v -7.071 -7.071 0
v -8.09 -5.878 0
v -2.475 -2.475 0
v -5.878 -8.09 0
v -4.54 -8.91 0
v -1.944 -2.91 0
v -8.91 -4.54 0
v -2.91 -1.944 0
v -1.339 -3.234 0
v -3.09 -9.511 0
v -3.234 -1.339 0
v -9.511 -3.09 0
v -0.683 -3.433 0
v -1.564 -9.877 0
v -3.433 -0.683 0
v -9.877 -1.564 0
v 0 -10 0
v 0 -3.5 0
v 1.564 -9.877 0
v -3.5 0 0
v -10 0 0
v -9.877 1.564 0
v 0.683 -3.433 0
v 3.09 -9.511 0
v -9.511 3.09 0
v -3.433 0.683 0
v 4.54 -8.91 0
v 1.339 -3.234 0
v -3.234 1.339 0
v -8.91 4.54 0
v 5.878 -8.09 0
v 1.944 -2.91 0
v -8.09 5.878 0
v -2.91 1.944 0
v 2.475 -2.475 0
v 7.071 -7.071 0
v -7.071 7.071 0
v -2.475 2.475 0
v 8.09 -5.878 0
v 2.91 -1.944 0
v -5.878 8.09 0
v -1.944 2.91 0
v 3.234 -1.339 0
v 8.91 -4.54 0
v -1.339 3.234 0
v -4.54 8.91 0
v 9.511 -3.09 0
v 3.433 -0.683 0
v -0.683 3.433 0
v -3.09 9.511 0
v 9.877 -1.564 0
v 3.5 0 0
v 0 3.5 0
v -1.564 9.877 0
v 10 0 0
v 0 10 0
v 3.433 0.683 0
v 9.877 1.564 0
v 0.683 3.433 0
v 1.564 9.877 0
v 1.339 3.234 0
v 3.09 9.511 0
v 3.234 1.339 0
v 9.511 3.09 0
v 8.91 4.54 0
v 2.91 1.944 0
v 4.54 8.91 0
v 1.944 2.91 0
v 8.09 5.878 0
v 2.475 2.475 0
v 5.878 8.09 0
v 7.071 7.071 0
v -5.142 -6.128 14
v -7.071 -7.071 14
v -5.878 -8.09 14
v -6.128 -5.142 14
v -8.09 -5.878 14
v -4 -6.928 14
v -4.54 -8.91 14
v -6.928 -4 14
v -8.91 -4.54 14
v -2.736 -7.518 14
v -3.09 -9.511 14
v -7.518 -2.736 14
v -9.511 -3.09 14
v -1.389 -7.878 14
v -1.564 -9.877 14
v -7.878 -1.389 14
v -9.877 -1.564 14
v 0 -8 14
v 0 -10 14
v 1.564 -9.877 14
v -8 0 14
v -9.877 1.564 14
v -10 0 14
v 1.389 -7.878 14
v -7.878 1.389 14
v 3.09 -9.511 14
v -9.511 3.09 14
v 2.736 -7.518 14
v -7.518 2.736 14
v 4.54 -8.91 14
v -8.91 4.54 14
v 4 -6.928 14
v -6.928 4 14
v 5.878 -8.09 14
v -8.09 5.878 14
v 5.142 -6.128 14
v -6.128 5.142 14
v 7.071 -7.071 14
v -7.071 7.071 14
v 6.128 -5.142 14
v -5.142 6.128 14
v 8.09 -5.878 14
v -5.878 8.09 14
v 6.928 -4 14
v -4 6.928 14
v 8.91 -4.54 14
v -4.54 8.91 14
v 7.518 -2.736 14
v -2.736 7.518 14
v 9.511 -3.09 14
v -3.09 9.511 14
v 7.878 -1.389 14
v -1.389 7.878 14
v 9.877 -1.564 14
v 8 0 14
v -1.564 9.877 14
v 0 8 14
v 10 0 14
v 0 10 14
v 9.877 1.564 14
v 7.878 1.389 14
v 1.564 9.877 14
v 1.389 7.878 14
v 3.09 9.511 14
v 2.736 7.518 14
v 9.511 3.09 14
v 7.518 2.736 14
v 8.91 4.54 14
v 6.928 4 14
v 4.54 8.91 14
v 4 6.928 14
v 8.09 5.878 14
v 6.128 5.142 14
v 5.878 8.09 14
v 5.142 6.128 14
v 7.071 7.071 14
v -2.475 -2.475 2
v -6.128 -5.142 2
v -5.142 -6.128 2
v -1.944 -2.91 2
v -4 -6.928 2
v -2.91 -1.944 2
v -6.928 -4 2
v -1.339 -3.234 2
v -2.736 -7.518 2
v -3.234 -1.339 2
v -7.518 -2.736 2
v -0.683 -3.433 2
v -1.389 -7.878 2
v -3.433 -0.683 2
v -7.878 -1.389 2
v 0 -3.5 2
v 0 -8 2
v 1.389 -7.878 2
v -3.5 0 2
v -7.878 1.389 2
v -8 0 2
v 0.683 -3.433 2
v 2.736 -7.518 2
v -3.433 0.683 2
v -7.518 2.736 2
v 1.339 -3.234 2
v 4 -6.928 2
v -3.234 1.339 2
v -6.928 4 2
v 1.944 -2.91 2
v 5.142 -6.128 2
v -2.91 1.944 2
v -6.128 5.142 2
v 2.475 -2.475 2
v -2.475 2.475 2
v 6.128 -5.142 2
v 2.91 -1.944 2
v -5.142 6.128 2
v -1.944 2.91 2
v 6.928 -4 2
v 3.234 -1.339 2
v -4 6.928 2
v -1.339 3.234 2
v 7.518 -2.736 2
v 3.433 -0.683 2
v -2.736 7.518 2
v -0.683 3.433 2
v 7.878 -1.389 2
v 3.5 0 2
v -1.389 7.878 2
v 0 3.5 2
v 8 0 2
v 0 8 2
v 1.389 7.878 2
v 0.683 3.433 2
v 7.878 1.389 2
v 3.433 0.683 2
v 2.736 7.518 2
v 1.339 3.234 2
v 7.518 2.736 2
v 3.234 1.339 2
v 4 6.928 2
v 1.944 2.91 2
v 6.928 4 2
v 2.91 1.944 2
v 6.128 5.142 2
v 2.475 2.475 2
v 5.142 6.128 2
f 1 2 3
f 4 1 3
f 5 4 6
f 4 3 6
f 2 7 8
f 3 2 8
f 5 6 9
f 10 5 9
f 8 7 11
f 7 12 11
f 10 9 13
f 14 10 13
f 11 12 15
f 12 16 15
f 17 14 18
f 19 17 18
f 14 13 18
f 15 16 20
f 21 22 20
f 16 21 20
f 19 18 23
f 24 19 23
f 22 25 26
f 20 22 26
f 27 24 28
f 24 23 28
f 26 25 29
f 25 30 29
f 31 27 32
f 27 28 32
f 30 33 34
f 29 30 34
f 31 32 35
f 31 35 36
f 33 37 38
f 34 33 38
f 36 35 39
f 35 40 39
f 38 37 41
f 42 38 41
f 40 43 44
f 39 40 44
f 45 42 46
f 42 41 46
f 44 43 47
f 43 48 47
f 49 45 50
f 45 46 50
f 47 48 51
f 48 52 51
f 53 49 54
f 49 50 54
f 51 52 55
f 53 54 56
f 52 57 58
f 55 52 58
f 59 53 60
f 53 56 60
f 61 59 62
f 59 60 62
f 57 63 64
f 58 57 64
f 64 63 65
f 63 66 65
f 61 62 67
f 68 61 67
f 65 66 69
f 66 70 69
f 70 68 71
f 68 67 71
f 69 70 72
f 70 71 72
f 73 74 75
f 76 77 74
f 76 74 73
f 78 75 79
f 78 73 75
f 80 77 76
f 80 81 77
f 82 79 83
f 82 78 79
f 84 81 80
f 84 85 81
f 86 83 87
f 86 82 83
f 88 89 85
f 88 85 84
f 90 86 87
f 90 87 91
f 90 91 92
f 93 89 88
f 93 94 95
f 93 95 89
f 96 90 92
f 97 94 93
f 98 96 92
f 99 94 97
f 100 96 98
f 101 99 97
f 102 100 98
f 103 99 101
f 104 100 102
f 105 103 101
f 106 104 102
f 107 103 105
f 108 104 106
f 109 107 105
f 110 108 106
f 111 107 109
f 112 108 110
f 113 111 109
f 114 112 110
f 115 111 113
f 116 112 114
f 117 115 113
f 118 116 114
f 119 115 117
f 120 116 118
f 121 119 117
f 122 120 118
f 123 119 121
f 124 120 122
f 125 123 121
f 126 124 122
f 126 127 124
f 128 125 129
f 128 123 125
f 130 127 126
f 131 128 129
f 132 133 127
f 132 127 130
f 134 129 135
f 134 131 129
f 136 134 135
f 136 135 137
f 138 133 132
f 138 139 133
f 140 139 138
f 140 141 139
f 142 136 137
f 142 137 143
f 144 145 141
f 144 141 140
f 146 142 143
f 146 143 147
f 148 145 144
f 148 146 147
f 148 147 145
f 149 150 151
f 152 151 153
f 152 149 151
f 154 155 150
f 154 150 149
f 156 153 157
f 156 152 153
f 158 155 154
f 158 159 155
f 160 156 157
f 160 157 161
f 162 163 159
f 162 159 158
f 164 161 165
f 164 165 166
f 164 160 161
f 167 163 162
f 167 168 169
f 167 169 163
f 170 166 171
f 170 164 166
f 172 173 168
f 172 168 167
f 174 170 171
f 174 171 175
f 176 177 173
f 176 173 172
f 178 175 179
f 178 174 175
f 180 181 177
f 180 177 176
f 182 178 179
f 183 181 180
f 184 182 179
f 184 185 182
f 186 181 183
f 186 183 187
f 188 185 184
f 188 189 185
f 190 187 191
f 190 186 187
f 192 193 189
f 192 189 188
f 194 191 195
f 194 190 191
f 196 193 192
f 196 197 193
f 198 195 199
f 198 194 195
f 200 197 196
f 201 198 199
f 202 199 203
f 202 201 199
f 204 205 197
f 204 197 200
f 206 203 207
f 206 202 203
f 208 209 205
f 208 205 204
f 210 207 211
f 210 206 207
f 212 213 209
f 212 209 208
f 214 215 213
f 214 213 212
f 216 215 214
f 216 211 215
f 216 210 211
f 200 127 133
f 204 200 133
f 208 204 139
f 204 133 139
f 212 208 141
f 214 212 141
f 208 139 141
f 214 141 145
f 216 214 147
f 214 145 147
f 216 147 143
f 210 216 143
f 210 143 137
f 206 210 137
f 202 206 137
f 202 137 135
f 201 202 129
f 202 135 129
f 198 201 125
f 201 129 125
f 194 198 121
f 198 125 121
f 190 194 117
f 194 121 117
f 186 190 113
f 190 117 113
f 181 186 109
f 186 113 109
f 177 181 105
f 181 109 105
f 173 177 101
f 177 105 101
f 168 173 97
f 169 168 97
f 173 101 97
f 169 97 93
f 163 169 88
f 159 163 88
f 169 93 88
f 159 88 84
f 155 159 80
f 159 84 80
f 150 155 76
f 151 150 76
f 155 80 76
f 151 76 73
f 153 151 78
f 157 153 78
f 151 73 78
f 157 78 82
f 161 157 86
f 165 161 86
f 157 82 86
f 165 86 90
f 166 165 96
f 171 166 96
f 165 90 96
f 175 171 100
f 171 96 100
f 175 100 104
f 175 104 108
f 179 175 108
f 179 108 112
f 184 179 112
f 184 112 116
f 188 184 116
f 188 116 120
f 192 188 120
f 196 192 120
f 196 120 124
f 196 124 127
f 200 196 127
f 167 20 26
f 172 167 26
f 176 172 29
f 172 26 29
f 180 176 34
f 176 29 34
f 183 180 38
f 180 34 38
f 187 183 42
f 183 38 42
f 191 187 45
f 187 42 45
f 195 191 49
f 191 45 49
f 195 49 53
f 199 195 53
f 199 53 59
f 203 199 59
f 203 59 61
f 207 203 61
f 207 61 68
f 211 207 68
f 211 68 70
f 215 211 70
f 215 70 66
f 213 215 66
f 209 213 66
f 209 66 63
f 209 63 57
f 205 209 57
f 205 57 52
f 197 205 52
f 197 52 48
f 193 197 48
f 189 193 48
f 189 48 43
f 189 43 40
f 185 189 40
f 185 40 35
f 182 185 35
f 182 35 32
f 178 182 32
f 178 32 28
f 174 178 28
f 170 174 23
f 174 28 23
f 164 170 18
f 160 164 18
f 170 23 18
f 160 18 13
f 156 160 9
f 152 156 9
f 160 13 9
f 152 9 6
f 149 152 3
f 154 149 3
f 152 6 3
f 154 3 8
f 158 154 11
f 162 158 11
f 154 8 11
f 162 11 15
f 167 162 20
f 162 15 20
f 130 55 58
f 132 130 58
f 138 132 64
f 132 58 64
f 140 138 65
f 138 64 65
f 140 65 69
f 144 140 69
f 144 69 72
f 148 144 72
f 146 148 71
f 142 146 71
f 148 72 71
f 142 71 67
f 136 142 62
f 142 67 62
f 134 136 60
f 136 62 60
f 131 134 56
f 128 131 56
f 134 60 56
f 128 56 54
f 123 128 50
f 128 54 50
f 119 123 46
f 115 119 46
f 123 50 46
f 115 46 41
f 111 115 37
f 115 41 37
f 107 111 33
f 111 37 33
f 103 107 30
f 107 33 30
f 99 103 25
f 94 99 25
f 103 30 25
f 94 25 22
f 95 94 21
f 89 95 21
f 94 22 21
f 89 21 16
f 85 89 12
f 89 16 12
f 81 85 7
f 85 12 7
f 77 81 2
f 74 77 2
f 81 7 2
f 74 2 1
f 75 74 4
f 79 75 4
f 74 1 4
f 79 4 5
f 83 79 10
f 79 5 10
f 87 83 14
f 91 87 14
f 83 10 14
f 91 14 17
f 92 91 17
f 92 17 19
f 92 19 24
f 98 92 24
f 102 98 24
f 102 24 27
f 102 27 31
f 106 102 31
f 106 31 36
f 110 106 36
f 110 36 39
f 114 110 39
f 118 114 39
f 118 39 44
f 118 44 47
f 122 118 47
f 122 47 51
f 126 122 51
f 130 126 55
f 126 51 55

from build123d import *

# Parameters (mm, degrees)
F0_R     = 10
F1_DEPTH = 14
F4_R     = 8
F5_DEPTH = 12
F6_D     = 7


with BuildPart() as f1:
    # F0 (on Top) → F1 (new body)
    with BuildSketch(Plane.XY):
        Circle(F0_R)
    extrude(amount=F1_DEPTH)

    # F4 (on offset) → F5 (cut)
    with BuildSketch(Plane.XY.offset(14)):
        Circle(F4_R)
    extrude(amount=-F5_DEPTH, mode=Mode.SUBTRACT)

    # F6 (through all)
    with Locations(Plane.XY.offset(14)):
        with Locations((0, 0)):
            Hole(F6_D / 2)


solid = f1.part
